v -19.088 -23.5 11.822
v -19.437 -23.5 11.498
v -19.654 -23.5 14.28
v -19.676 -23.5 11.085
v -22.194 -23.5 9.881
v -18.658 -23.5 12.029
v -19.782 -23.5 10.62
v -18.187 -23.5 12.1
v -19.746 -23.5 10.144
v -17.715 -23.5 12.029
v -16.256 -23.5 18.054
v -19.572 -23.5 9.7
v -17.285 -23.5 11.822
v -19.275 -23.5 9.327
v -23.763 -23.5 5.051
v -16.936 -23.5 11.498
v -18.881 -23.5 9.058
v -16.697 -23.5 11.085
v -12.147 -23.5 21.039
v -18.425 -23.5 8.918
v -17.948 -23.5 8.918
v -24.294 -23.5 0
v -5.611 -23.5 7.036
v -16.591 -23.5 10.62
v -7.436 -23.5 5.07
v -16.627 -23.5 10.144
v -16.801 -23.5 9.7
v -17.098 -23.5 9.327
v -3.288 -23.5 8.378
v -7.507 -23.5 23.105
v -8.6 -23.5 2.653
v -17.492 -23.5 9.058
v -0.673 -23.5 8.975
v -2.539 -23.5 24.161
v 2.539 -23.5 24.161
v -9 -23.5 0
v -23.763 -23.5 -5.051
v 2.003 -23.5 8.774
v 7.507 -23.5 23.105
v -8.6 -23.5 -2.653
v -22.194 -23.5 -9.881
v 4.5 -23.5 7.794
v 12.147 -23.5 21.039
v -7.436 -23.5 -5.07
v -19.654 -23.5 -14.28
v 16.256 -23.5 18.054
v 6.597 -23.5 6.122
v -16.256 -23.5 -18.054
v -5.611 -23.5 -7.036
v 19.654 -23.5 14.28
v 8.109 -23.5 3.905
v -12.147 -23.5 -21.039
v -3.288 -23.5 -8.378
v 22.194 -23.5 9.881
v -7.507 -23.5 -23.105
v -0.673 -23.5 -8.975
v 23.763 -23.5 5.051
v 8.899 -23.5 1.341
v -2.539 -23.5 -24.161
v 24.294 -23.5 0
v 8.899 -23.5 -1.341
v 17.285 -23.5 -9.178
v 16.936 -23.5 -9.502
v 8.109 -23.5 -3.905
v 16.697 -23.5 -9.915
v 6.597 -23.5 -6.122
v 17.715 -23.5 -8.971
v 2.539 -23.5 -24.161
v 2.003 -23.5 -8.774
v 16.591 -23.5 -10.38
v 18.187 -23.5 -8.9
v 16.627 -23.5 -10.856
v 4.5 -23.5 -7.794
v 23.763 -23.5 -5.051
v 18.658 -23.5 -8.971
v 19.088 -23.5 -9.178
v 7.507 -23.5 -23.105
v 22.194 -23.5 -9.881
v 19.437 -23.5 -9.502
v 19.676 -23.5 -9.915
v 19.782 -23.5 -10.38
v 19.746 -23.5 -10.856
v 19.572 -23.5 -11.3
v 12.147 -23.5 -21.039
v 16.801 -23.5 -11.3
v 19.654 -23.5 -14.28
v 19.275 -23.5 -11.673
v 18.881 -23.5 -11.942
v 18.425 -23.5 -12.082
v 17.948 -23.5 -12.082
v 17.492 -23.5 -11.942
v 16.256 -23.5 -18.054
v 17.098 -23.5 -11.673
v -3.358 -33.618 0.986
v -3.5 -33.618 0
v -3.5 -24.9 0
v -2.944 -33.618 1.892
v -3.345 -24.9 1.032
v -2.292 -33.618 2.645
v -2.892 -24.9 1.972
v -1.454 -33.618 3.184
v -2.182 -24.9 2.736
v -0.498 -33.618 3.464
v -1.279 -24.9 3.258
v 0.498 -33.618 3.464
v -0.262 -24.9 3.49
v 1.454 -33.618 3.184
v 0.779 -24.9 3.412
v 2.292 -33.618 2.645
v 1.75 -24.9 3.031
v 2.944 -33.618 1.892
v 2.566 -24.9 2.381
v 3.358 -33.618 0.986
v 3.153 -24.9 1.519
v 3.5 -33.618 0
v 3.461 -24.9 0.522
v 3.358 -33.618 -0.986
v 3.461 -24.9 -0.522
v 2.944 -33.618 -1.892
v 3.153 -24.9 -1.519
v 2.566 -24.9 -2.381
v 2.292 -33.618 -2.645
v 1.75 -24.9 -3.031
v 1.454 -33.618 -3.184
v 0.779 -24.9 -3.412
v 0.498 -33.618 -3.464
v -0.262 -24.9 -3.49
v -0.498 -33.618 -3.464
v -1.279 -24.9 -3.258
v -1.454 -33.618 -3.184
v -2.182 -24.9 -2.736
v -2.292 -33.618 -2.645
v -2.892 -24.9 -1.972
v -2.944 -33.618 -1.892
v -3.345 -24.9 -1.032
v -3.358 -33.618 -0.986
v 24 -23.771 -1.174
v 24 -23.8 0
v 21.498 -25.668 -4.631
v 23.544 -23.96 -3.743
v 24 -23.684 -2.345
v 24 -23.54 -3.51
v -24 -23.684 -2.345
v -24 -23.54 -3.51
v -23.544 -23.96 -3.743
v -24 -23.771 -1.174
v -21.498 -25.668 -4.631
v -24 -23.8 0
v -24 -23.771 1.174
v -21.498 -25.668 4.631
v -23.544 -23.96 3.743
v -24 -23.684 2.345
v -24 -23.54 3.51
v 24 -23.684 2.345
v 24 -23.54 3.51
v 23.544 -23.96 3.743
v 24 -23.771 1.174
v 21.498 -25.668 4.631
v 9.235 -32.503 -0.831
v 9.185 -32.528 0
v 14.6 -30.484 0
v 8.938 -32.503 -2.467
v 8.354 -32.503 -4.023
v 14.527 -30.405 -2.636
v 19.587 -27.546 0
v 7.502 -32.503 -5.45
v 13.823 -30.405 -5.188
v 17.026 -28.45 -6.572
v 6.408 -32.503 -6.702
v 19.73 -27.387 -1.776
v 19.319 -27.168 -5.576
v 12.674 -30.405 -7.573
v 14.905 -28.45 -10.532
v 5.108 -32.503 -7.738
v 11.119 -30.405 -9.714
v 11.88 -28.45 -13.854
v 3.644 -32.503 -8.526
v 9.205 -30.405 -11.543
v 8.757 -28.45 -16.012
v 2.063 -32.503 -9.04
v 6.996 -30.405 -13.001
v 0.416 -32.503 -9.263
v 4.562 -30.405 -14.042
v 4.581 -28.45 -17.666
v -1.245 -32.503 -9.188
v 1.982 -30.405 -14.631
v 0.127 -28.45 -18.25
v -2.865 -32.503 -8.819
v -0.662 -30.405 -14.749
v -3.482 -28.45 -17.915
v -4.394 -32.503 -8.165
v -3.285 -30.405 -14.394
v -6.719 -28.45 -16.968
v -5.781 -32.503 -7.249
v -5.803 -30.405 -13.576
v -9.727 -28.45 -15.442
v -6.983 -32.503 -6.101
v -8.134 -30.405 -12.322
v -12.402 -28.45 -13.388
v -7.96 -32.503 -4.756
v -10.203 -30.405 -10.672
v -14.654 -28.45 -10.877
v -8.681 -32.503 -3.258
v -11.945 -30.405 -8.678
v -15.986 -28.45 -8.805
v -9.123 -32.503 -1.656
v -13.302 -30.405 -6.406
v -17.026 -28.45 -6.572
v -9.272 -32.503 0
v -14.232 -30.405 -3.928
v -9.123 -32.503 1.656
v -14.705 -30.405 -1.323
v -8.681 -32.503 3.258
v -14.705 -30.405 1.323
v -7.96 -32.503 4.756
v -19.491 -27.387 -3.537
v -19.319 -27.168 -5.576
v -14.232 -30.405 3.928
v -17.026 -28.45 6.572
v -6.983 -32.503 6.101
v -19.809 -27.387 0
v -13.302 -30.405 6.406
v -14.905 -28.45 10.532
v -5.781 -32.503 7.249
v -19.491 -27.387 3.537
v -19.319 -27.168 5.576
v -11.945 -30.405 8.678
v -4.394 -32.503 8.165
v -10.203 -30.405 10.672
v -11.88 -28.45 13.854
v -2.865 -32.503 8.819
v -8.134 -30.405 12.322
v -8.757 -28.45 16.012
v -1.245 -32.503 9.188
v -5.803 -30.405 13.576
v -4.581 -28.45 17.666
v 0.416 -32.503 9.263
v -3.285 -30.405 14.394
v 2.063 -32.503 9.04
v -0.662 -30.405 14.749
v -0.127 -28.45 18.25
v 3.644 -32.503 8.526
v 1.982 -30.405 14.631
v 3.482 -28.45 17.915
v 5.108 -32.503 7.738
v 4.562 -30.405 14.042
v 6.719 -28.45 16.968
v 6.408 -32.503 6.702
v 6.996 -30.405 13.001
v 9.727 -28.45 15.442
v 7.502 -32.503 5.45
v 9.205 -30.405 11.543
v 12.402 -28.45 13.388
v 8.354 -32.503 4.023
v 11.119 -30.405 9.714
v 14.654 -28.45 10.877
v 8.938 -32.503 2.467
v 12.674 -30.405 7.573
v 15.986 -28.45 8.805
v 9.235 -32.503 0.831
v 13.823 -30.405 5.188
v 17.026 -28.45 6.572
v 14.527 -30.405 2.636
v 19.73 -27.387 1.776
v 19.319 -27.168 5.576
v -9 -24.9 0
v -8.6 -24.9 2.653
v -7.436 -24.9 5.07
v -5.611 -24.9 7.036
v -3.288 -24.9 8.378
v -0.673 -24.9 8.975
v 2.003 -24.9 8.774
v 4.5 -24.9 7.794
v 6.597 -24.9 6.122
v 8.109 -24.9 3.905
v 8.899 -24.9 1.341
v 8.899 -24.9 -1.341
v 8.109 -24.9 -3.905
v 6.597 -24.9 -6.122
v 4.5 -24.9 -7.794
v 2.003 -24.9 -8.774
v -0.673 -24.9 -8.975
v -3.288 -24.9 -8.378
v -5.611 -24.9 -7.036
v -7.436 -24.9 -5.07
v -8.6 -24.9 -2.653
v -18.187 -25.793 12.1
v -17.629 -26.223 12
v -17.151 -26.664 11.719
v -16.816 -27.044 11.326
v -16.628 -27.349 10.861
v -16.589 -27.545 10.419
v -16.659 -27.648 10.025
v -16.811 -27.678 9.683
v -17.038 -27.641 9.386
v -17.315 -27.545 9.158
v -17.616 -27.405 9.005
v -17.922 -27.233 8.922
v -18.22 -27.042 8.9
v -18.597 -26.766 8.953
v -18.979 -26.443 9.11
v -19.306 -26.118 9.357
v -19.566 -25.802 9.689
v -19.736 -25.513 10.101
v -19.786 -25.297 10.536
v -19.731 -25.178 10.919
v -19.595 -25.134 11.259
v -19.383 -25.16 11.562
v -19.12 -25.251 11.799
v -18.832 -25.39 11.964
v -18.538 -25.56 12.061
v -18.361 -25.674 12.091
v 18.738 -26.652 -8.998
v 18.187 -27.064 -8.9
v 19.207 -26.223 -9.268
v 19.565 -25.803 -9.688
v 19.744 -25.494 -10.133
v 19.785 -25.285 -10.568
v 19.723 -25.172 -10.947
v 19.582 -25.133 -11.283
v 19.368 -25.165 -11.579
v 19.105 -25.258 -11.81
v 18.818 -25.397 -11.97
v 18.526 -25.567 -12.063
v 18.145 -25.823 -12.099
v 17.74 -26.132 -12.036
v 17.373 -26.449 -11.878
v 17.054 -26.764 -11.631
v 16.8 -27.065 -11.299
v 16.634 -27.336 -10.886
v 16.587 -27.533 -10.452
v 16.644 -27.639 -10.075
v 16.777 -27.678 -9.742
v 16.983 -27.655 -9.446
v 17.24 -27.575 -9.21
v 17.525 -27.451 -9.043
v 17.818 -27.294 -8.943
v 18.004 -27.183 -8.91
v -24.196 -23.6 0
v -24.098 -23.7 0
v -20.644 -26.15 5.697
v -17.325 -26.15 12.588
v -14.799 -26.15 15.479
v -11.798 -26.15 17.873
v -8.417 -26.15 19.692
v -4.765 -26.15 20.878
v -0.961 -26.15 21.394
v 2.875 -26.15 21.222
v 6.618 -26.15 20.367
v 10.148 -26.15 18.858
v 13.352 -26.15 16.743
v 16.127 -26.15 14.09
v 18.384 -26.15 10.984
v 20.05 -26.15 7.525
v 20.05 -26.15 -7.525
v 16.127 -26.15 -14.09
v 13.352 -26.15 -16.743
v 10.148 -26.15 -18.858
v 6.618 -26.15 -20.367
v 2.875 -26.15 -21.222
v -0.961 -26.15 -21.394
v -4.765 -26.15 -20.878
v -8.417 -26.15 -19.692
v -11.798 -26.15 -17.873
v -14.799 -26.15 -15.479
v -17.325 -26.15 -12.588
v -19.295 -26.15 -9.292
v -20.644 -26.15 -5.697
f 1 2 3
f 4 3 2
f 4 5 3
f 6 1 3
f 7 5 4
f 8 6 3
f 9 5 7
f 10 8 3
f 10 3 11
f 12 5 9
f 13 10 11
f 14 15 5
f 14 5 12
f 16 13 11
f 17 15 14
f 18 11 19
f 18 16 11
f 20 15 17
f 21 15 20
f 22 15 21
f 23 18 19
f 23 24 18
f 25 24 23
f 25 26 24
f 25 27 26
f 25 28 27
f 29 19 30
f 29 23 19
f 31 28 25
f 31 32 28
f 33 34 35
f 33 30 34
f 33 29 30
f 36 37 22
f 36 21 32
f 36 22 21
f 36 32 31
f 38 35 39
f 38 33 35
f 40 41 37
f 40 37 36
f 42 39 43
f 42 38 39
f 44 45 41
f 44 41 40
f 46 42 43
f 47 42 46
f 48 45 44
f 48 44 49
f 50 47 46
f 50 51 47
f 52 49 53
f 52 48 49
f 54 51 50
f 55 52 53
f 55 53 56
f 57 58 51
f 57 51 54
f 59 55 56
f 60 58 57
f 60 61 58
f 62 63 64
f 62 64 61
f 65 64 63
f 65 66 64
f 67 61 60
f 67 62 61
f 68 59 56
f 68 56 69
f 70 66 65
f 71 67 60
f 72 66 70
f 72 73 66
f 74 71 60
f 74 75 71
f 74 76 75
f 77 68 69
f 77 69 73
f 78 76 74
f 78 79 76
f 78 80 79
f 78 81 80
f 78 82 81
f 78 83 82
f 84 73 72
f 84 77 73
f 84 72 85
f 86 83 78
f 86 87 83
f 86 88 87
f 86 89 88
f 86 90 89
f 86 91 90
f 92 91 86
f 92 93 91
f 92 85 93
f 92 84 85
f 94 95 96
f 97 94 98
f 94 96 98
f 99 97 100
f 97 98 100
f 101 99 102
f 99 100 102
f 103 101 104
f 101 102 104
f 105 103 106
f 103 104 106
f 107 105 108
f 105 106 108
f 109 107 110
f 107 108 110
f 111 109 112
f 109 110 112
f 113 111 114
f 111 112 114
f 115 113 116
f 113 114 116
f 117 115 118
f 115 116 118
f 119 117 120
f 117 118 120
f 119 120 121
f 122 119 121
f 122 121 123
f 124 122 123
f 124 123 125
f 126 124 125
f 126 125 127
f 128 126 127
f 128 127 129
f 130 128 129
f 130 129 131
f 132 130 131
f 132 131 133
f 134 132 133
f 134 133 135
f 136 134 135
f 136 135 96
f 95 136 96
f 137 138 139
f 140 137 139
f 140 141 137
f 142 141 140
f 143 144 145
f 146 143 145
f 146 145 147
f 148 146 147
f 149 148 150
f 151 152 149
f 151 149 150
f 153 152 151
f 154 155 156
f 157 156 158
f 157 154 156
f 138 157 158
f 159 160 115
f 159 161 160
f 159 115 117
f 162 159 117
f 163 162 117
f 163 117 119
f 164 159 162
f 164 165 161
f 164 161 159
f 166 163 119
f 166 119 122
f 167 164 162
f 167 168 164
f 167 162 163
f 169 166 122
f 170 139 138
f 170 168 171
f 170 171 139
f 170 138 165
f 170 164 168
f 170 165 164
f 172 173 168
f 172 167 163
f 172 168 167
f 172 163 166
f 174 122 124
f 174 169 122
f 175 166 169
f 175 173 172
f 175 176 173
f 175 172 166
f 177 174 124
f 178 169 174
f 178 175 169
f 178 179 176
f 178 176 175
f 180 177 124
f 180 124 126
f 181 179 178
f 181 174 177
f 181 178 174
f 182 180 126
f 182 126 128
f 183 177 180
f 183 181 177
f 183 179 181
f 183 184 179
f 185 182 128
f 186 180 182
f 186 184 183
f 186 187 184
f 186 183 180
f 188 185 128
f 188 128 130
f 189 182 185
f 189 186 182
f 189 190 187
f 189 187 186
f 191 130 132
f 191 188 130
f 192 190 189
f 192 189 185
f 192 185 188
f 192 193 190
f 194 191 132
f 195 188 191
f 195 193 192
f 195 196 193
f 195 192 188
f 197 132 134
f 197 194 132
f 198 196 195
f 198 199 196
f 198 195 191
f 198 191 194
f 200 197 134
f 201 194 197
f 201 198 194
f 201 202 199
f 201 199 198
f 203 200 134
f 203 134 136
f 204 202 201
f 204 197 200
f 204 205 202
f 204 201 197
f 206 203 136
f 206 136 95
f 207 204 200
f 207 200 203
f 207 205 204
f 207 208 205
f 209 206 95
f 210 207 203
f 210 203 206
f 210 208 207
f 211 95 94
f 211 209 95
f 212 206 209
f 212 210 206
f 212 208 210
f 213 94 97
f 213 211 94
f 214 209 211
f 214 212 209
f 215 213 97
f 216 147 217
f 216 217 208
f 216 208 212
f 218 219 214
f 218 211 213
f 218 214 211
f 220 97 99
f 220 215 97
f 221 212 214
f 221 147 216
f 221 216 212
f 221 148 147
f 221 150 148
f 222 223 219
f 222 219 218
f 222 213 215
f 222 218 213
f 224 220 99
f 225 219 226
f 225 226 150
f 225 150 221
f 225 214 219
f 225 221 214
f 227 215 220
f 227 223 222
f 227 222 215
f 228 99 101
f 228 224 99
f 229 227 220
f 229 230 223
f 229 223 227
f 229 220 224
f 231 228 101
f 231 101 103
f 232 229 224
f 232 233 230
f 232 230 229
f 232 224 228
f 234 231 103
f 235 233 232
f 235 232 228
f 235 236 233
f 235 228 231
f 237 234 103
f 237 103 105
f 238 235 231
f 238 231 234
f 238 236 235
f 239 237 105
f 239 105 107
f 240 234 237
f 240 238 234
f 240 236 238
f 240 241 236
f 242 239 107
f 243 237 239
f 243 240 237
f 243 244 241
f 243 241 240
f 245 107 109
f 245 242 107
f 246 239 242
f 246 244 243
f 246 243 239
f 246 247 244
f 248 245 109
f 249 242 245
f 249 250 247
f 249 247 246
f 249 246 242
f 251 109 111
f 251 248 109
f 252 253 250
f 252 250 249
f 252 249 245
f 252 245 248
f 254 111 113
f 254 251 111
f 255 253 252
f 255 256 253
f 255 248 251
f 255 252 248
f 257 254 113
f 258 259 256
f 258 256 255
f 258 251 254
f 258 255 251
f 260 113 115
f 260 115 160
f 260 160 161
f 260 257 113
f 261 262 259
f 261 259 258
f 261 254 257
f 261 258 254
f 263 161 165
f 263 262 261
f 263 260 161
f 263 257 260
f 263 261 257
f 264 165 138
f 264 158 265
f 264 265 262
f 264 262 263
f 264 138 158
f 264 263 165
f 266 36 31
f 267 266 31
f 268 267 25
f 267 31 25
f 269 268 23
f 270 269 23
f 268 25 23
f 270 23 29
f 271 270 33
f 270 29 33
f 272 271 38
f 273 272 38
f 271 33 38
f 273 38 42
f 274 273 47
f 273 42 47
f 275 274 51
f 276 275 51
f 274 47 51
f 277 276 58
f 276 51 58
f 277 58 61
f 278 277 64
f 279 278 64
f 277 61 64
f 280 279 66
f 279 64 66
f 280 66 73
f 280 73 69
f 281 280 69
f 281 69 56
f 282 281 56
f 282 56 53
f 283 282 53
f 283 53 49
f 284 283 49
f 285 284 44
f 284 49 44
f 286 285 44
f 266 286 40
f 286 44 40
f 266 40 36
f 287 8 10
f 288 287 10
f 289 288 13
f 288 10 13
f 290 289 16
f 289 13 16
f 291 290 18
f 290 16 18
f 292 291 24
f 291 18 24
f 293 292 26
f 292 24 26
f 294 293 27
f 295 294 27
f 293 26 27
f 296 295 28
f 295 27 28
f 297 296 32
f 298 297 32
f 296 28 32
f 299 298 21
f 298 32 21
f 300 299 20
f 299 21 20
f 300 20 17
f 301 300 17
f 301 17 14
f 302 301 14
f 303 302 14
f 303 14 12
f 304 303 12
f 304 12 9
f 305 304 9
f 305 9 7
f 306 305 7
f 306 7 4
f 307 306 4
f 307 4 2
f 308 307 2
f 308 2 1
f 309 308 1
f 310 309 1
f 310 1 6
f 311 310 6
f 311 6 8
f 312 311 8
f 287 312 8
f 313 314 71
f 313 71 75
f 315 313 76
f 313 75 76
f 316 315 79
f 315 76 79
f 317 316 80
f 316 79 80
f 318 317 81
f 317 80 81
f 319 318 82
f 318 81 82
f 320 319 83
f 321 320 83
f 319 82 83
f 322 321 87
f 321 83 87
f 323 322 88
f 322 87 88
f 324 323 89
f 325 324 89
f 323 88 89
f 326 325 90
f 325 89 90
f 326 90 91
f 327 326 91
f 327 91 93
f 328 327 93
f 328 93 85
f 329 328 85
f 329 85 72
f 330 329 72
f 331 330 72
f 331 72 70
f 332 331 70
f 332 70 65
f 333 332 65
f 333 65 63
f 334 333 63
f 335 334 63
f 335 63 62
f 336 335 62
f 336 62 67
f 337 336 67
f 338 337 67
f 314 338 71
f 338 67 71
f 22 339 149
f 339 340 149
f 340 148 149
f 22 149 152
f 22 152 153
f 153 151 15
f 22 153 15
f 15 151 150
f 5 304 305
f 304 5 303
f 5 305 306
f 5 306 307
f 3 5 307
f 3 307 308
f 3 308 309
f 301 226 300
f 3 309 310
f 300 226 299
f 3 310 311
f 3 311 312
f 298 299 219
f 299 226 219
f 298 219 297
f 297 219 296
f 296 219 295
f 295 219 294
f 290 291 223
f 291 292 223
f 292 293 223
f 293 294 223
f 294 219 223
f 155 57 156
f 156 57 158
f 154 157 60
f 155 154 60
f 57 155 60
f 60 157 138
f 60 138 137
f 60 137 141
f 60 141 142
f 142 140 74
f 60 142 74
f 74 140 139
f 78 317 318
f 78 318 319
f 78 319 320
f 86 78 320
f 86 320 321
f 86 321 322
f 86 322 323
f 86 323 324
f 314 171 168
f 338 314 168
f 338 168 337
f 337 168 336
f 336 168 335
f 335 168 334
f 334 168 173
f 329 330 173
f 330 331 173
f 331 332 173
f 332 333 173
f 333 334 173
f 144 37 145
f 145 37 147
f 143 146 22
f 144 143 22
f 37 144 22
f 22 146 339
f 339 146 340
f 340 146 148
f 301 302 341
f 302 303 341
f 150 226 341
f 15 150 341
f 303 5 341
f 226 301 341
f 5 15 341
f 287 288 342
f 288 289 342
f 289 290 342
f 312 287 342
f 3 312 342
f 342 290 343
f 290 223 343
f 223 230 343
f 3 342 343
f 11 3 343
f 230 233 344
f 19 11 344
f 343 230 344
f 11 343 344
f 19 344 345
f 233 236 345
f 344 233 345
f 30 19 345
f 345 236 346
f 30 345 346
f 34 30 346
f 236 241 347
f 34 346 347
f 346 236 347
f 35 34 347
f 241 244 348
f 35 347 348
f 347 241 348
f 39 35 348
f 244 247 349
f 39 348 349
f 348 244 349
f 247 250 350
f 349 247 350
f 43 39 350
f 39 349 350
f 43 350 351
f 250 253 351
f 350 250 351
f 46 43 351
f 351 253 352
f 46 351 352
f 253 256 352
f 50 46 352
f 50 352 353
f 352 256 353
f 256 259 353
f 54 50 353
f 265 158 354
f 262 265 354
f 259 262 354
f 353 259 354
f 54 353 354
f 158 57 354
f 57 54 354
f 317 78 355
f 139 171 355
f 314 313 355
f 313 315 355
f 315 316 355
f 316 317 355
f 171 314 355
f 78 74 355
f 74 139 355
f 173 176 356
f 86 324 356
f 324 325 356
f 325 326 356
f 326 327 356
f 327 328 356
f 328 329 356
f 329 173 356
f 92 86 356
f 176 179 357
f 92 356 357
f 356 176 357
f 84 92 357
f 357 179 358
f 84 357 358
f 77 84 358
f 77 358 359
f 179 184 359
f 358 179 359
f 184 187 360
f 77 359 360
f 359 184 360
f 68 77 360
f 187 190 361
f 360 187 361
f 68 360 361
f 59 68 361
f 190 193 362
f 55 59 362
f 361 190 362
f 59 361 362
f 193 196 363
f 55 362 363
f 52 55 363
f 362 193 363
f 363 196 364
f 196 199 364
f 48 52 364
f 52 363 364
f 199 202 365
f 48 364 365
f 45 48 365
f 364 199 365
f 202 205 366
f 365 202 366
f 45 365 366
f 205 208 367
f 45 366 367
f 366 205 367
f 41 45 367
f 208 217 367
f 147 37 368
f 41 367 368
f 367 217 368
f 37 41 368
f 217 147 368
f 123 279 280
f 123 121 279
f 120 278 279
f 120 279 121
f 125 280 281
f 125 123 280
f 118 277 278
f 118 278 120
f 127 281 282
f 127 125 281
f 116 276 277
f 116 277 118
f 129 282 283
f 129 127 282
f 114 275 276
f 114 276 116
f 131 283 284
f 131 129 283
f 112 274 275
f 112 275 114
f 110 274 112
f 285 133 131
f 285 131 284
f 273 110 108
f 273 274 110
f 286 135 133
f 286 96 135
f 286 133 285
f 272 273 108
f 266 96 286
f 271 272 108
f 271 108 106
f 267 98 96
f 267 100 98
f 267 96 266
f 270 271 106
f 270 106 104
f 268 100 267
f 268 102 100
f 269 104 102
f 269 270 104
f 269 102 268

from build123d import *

# Parameters (mm, degrees)
SKETCH2_R                = 33.8
CUT_EXTRUDE1_DEPTH       = 19.1
CUT_EXTRUDE2_START       = -33.8
CUT_EXTRUDE2_DEPTH       = 14.7
BOSS_EXTRUDE2_START      = -1.7
BOSS_EXTRUDE2_DEPTH      = 1.7
SKETCH19_R               = 9
CUT_EXTRUDE10_DEPTH      = 1.4
CUT_EXTRUDE11_REACH      = 42.429
CUT_EXTRUDE11_END_RADIUS = 33.8
SKETCH20_R               = 3.5
CUT_EXTRUDE7_REACH       = 44.024
CUT_EXTRUDE7_END_RADIUS  = 33.8
SKETCH10_R               = 1.6
CUT_EXTRUDE12_REACH      = 42.714
SKETCH21_R               = 27.886018002


# Read off the part's stored shape, not the designer's step: Revolve2
with BuildPart() as part:
    # Sketch1 → Revolve1 (revolve)
    with BuildSketch(Plane.XY, mode=Mode.PRIVATE) as revolve1_sk:
        with BuildLine():
            Line((0, -33.8), (0, 0))
            Line((0, 0), (33.8, 0))
            ThreePointArc((33.8, 0), (23.900209204, -23.900209204), (0, -33.8))
        make_face()
    revolve(revolve1_sk.sketch.rotate(Axis((0, -33.8, 0), (0, 1, 0)), 180), axis=Axis((0, -33.8, 0), (0, 1, 0)))

    # Sketch2 → Cut-Extrude1 (cut)
    with BuildSketch(Plane(origin=(0, 0, 0), x_dir=(1, 0, 0), z_dir=(0, 1, 0))):
        Circle(SKETCH2_R)
    extrude(amount=-CUT_EXTRUDE1_DEPTH, mode=Mode.SUBTRACT)

    # Sketch5 → Cut-Extrude2 (cut)
    with BuildSketch(Plane(origin=(0, 0, 0), x_dir=(1, 0, 0), z_dir=(0, 1, 0)).offset(CUT_EXTRUDE2_START)):
        with BuildLine():
            Line((-17.025732229, 6.571677263), (-23.544283672, 3.742739979))
            ThreePointArc((-23.544283672, 3.742739979), (-23.775794442, 3.633514413), (-24, 3.509985755))
            Line((-24, 3.509985755), (-24, -3.509985755))
            ThreePointArc((-24, -3.509985755), (-23.775794442, -3.633514413), (-23.544283672, -3.742739979))
            Line((-23.544283672, -3.742739979), (-17.025732229, -6.571677263))
            ThreePointArc((-17.025732229, -6.571677263), (0, -18.25), (17.025732229, -6.571677263))
            Line((17.025732229, -6.571677263), (23.544283672, -3.742739979))
            ThreePointArc((23.544283672, -3.742739979), (23.775794442, -3.633514413), (24, -3.509985755))
            Line((24, -3.509985755), (24, 3.509985755))
            ThreePointArc((24, 3.509985755), (23.775794442, 3.633514413), (23.544283672, 3.742739979))
            Line((23.544283672, 3.742739979), (17.025732229, 6.571677263))
            ThreePointArc((17.025732229, 6.571677263), (0, 18.25), (-17.025732229, 6.571677263))
        make_face()
    extrude(amount=CUT_EXTRUDE2_DEPTH, mode=Mode.SUBTRACT)

    # Sketch16 → Boss-Extrude2 (add)
    with BuildSketch(Plane(origin=(0, -19.1, 0), x_dir=(1, 0, 0), z_dir=(0, 1, 0)).offset(BOSS_EXTRUDE2_START)):
        with BuildLine():
            Line((17.025732229, 6.571677263), (23.544283672, 3.742739979))
            ThreePointArc((23.544283672, 3.742739979), (23.775794442, 3.633514413), (24, 3.509985755))
            Line((24, 3.509985755), (24, -3.509985755))
            ThreePointArc((24, -3.509985755), (23.775794442, -3.633514413), (23.544283672, -3.742739979))
            Line((23.544283672, -3.742739979), (17.025732229, -6.571677263))
            ThreePointArc((17.025732229, -6.571677263), (18.25, 0), (17.025732229, 6.571677263))
        make_face()
        with BuildLine():
            Line((-23.544283672, -3.742739979), (-17.025732229, -6.571677263))
            ThreePointArc((-17.025732229, -6.571677263), (-18.25, 0), (-17.025732229, 6.571677263))
            Line((-17.025732229, 6.571677263), (-23.544283672, 3.742739979))
            ThreePointArc((-23.544283672, 3.742739979), (-23.775794442, 3.633514413), (-24, 3.509985755))
            Line((-24, 3.509985755), (-24, -3.509985755))
            ThreePointArc((-24, -3.509985755), (-23.775794442, -3.633514413), (-23.544283672, -3.742739979))
        make_face()
    extrude(amount=BOSS_EXTRUDE2_DEPTH)

    # Revolve2 outline → Revolve2 (revolve)
    with BuildSketch(Plane.XY):
        with BuildLine():
            Line((0, -23.5), (0, -33.8))
            ThreePointArc((0, -33.8), (13.168073663, -31.129436808), (24.255308697, -23.53975361))
            Line((24.255308697, -23.53975361), (24.255308697, -23.5))
            Line((24.255308697, -23.5), (0, -23.5))
        make_face()
    revolve(axis=Axis((0, 0, 0), (0, 1, 0)))

    # Sketch19 → Cut-Extrude10 (cut)
    with BuildSketch(Plane(origin=(0, -23.5, 0), x_dir=(1, 0, 0), z_dir=(0, 1, 0))):
        with Locations(Location((0, 0, 0), (0, 0, 180))):
            Circle(SKETCH19_R)
    extrude(amount=-CUT_EXTRUDE10_DEPTH, mode=Mode.SUBTRACT)

    # Cut-Extrude11: up to this sphere (the profile starts inside it)
    cut_extrude11_end = Location((0, 0, 0)) * Sphere(CUT_EXTRUDE11_END_RADIUS, mode=Mode.PRIVATE)
    # Sketch20 → Cut-Extrude11 (cut, up to the surface)
    with BuildSketch(Plane(origin=(0, -24.9, 0), x_dir=(1, 0, 0), z_dir=(0, 1, 0)), mode=Mode.PRIVATE) as cut_extrude11_sk1:
        with Locations(Location((0, 0, 0), (0, 0, 180))):
            Circle(SKETCH20_R)
    cut_extrude11_tool1 = extrude(cut_extrude11_sk1.sketch, amount=-CUT_EXTRUDE11_REACH, mode=Mode.PRIVATE) & cut_extrude11_end
    add(cut_extrude11_tool1.solids().sort_by_distance((0, -24.9, 0))[0], mode=Mode.SUBTRACT)

    # Cut-Extrude7: up to this sphere (the profile starts inside it)
    cut_extrude7_end = Location((0, 0, 0)) * Sphere(CUT_EXTRUDE7_END_RADIUS, mode=Mode.PRIVATE)
    # Sketch10 → Cut-Extrude7 (cut, up to the surface)
    with BuildSketch(Plane(origin=(0, -19.1, 0), x_dir=(1, 0, 0), z_dir=(0, 1, 0)), mode=Mode.PRIVATE) as cut_extrude7_sk1:
        with Locations(Location((-18.186533479, -10.5, 0), (0, 0, 270))):
            Circle(SKETCH10_R)
    cut_extrude7_tool1 = extrude(cut_extrude7_sk1.sketch, amount=-CUT_EXTRUDE7_REACH, mode=Mode.PRIVATE) & cut_extrude7_end
    add(cut_extrude7_tool1.solids().sort_by_distance((-18.186533, -19.1, 10.5))[0], mode=Mode.SUBTRACT)
    # Sketch10 → Cut-Extrude7 (cut, up to the surface)
    with BuildSketch(Plane(origin=(0, -19.1, 0), x_dir=(1, 0, 0), z_dir=(0, 1, 0)), mode=Mode.PRIVATE) as cut_extrude7_sk2:
        with Locations(Location((18.186533479, 10.5, 0), (0, 0, 270))):
            Circle(SKETCH10_R)
    cut_extrude7_tool2 = extrude(cut_extrude7_sk2.sketch, amount=-CUT_EXTRUDE7_REACH, mode=Mode.PRIVATE) & cut_extrude7_end
    add(cut_extrude7_tool2.solids().sort_by_distance((18.186533, -19.1, -10.5))[0], mode=Mode.SUBTRACT)

    # Sketch21 → Cut-Extrude12 (cut, up to next)
    with BuildSketch(Plane(origin=(0, -23.5, 0), x_dir=(1, 0, 0), z_dir=(0, 1, 0)), mode=Mode.PRIVATE) as cut_extrude12_sk1:
        Circle(SKETCH21_R)
    cut_extrude12_tool1 = extrude(cut_extrude12_sk1.sketch, amount=CUT_EXTRUDE12_REACH, mode=Mode.PRIVATE) & part.part
    add(cut_extrude12_tool1.solids().sort_by_distance((0, -23.5, 0))[0], mode=Mode.SUBTRACT)


solid = part.part
